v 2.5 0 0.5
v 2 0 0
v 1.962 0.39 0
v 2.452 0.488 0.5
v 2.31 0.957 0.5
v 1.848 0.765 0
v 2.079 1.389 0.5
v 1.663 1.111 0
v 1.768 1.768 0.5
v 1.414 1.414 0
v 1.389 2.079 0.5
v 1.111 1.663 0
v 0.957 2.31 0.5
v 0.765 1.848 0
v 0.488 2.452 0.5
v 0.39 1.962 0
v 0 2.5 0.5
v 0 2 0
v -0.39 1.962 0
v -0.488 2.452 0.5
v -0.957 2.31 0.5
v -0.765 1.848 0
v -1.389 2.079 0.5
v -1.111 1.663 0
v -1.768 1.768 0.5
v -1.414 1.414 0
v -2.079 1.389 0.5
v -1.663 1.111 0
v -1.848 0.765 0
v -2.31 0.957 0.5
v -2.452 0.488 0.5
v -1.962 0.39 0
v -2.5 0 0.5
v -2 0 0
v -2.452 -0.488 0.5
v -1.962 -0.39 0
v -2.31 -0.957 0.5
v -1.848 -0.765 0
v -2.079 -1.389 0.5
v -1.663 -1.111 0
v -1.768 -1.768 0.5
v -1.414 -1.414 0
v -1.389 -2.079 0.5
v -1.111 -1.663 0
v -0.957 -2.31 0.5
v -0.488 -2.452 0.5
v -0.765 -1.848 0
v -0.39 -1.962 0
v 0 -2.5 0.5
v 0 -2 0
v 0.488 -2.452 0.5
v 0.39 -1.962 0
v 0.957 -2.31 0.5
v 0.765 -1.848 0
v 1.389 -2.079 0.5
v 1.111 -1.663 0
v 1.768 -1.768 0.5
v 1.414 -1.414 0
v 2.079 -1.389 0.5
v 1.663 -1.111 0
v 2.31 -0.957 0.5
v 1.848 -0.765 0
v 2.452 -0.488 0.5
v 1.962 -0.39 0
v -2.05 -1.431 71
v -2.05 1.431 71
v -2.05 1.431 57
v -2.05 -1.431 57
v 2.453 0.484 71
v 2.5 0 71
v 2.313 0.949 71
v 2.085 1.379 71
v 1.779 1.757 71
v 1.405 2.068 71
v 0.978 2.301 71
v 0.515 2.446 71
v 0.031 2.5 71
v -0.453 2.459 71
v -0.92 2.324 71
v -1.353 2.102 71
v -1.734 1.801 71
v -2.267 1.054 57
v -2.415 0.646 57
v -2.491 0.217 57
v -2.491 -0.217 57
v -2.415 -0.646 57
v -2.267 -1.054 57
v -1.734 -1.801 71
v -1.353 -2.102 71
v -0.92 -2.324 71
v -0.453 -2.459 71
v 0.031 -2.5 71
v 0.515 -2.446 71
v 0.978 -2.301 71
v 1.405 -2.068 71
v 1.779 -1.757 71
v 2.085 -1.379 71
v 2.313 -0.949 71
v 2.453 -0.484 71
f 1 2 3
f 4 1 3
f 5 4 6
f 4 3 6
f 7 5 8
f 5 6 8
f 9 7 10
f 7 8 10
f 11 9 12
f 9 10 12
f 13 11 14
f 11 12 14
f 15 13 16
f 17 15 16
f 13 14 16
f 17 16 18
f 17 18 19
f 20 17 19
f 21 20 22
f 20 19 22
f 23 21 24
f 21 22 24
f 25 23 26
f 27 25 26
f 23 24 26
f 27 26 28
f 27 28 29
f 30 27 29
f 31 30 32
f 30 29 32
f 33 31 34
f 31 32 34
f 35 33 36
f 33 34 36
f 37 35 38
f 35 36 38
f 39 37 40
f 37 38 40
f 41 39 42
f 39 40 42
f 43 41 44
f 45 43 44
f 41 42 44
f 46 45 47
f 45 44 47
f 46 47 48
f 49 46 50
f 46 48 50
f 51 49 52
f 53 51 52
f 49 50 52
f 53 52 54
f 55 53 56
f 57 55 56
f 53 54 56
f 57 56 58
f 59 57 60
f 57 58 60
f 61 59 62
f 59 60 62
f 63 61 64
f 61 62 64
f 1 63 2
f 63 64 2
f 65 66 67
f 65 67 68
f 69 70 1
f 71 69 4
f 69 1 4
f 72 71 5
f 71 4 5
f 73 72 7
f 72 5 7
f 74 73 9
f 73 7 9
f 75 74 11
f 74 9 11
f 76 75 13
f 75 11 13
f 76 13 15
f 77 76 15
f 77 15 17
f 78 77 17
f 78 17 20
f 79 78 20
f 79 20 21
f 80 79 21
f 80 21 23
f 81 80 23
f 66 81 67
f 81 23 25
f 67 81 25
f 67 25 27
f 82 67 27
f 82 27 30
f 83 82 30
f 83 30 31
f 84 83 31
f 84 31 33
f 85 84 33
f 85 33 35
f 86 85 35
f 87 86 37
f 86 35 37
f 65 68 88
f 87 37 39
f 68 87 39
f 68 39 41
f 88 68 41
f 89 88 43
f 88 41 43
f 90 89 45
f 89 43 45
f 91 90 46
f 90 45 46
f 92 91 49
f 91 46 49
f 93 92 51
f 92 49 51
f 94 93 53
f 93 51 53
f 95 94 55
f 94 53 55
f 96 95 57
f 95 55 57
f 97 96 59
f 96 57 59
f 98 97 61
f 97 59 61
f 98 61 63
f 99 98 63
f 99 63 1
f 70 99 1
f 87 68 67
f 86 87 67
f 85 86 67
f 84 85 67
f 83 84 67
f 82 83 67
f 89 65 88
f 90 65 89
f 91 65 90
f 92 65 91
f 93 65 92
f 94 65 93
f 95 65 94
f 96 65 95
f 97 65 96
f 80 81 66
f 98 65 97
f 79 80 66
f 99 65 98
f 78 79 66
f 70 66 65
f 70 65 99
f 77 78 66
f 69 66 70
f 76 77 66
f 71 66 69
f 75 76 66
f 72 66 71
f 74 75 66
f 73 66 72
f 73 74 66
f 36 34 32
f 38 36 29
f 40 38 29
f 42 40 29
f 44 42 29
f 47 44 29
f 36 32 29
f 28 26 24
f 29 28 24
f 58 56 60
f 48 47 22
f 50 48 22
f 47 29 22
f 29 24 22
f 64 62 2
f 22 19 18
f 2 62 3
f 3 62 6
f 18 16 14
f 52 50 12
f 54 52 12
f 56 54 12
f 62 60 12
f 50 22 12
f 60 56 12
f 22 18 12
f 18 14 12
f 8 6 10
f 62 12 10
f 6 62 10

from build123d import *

# Parameters (mm, degrees)
CROQUIS1_R              = 2.5
SALIENTE_EXTRUIR1_DEPTH = 71
CUT_EXTRUDE1_DEPTH      = 14
CHAMFER1_SIZE           = 0.5


with BuildPart() as part:
    # Croquis1 → Saliente-Extruir1 (new body)
    with BuildSketch(Plane.XY):
        Circle(CROQUIS1_R)
    extrude(amount=SALIENTE_EXTRUIR1_DEPTH)

    # Sketch1 → Cut-Extrude1 (cut)
    with BuildSketch(Plane.XY.offset(71)):
        with BuildLine():
            Line((-2.05, 1.430908802), (-2.05, -1.430908802))
            ThreePointArc((-2.05, -1.430908802), (-2.5, 0), (-2.05, 1.430908802))
        make_face()
    extrude(amount=-CUT_EXTRUDE1_DEPTH, mode=Mode.SUBTRACT)

    # Chamfer1
    chamfer1_edges = [part.edges().sort_by_distance(p)[0] for p in [
        (-2.5, 0, 0),
    ]]
    chamfer(chamfer1_edges, length=CHAMFER1_SIZE)


solid = part.part
